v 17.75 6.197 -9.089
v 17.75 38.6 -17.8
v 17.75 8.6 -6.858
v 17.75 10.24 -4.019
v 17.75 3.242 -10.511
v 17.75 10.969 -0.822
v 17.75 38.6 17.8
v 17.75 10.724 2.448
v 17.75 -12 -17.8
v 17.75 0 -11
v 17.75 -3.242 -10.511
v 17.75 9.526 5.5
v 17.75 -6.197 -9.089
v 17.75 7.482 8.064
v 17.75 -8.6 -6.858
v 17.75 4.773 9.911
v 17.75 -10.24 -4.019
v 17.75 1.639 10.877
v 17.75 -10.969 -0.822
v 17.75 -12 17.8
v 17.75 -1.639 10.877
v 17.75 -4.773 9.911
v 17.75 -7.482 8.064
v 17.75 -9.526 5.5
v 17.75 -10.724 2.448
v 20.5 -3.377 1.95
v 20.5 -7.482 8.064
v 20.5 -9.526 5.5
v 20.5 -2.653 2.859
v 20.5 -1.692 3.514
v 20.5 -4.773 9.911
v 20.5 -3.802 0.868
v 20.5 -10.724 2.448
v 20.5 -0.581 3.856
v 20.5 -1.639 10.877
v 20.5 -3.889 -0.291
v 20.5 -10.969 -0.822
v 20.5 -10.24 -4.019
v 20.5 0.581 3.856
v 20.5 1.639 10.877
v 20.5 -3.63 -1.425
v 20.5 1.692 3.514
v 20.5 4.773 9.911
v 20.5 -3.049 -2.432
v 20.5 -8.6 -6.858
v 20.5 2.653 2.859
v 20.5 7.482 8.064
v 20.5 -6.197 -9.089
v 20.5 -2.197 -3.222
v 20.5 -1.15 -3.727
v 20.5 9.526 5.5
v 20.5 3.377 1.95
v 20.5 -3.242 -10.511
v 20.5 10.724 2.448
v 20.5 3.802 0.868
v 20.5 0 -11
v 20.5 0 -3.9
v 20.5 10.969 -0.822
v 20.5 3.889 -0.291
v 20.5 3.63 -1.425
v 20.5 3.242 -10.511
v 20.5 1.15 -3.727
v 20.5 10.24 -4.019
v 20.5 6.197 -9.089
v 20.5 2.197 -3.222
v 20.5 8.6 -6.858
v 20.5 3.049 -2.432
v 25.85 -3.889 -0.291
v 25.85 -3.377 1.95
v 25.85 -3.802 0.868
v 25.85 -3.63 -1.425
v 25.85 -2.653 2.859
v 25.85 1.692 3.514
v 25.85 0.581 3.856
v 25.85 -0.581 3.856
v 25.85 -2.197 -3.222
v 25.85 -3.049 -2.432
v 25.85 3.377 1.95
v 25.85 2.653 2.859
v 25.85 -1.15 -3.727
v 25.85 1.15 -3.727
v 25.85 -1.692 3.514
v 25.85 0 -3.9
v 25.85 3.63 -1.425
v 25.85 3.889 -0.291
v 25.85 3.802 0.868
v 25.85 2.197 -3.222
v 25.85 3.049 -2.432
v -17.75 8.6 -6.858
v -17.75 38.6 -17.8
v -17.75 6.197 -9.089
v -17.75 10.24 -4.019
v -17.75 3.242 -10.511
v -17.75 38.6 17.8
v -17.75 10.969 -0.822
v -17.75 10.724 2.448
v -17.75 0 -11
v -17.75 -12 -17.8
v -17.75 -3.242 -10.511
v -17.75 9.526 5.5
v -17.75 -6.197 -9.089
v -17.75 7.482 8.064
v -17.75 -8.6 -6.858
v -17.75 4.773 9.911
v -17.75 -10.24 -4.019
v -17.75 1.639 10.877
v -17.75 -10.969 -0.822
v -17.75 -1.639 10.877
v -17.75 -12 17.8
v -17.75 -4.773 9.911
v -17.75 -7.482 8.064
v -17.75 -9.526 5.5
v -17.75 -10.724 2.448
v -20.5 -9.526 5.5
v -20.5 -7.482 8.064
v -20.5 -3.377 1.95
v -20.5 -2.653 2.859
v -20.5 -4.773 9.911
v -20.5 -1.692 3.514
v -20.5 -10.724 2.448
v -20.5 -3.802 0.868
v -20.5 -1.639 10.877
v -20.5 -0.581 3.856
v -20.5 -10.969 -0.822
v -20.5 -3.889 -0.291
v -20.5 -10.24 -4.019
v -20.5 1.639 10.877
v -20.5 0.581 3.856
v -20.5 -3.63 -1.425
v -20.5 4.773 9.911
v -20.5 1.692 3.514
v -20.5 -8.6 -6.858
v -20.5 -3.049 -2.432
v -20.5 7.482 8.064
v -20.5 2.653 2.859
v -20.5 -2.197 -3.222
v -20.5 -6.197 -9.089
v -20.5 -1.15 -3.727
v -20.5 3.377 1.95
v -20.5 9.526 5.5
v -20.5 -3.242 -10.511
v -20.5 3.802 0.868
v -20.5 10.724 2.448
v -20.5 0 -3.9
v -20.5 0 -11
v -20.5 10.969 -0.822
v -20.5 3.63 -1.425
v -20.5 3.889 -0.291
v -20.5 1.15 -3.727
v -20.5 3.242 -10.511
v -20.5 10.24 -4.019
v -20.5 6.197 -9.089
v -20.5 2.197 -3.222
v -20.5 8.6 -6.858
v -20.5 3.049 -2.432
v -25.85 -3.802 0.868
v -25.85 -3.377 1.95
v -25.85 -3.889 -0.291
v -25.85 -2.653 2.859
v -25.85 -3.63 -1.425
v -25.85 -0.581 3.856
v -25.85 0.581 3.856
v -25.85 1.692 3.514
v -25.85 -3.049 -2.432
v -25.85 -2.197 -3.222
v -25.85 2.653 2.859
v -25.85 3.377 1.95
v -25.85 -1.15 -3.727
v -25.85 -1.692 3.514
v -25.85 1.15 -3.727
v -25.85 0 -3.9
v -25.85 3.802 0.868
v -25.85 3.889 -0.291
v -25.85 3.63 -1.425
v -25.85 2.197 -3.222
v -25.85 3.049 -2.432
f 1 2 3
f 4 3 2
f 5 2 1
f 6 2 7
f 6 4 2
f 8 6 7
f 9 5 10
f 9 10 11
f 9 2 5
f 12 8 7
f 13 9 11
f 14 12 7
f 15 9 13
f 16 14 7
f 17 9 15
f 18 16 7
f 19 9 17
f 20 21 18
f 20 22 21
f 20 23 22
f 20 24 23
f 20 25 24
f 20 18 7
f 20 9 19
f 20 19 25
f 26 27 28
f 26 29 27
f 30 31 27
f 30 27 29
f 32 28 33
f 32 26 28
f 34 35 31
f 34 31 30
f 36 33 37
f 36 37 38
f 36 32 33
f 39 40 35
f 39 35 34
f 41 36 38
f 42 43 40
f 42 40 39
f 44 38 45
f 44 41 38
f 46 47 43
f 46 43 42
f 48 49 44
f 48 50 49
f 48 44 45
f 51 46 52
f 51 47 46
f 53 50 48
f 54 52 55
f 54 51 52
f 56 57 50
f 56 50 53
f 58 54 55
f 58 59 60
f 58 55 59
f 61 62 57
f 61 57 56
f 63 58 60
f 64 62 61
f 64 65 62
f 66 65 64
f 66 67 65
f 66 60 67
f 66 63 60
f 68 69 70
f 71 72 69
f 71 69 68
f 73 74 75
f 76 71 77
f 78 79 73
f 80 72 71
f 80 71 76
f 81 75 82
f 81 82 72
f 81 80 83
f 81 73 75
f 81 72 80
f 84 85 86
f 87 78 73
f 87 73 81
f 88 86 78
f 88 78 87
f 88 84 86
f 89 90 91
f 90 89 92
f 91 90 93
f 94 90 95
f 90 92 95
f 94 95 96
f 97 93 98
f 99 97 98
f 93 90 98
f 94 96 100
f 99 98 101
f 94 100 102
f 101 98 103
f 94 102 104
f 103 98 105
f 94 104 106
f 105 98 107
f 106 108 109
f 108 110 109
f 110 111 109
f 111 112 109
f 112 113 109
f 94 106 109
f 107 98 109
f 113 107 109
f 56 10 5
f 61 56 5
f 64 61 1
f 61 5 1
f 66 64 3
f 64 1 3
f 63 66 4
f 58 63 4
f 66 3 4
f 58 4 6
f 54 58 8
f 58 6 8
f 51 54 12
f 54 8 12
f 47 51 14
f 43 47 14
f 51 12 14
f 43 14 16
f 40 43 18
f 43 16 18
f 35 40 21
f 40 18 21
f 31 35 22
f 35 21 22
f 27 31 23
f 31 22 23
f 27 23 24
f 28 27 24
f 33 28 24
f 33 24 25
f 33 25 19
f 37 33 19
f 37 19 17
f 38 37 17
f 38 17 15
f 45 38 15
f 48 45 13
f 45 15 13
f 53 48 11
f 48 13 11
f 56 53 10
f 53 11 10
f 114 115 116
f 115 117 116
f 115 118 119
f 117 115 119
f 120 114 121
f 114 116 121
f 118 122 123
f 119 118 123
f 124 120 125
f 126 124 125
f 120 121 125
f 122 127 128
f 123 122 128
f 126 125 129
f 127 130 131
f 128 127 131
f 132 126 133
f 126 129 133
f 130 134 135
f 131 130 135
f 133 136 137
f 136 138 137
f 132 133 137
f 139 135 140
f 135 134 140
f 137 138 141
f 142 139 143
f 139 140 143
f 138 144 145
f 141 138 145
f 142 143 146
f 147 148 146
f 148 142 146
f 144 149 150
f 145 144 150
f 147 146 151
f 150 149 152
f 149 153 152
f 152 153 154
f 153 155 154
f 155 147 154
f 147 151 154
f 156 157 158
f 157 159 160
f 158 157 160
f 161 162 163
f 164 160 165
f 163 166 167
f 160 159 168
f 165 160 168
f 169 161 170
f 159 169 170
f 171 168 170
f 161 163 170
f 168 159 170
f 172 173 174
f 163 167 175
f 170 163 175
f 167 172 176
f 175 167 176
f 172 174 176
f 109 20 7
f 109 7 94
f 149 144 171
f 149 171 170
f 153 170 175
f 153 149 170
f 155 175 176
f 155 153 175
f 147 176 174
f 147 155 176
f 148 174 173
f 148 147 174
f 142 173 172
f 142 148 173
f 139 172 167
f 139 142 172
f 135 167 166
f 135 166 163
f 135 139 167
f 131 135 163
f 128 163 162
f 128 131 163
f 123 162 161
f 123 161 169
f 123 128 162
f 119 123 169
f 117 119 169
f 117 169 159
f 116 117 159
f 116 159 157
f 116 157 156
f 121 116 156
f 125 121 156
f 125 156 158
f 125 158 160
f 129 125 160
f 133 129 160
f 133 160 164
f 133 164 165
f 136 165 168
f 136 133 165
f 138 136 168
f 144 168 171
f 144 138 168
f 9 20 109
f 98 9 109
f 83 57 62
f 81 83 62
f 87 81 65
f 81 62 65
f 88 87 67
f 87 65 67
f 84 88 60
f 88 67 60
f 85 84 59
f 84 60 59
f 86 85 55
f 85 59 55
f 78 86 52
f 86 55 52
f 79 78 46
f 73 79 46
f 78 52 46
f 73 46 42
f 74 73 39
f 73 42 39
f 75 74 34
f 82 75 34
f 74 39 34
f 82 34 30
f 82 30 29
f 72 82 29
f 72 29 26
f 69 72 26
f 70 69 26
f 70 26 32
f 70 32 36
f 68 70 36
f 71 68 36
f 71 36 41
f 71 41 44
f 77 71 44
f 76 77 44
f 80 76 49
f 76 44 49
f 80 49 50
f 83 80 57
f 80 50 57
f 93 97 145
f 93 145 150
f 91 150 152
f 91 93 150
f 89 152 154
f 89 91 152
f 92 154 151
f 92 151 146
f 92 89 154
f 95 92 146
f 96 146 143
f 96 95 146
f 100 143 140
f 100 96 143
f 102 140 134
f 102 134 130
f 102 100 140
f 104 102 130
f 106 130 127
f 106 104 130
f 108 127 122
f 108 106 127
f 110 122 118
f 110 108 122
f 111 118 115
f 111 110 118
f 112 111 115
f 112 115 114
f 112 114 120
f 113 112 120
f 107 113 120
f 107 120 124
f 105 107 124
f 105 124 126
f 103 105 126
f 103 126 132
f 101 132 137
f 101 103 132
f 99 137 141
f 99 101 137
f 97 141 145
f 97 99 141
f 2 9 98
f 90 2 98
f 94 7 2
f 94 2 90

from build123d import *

# Parameters (mm, degrees)
SKETCH2_W           = 35.5
SKETCH2_H           = 35.6
BOSS_EXTRUDE1_DEPTH = 50.6
SKETCH3_R           = 11
BOSS_EXTRUDE2_DEPTH = 2.75
SKETCH4_R           = 3.9
BOSS_EXTRUDE3_DEPTH = 5.35


with BuildPart() as part:
    # Sketch2 → Boss-Extrude1 (new body)
    with BuildSketch(Plane(origin=(0, -12, 0), x_dir=(-1, 0, 0), z_dir=(0, 1, 0))):
        Rectangle(SKETCH2_W, SKETCH2_H)
    extrude(amount=BOSS_EXTRUDE1_DEPTH)

    # Sketch3 → Boss-Extrude2 (add)
    with BuildSketch(Plane(origin=(17.75, 0, 0), x_dir=(0, 0, -1), z_dir=(1, 0, 0))):
        Circle(SKETCH3_R)
    boss_extrude2 = extrude(amount=BOSS_EXTRUDE2_DEPTH)

    # Sketch4 → Boss-Extrude3 (add)
    with BuildSketch(Plane(origin=(20.5, 0, 0), x_dir=(0, 0, -1), z_dir=(1, 0, 0))):
        Circle(SKETCH4_R)
    boss_extrude3 = extrude(amount=BOSS_EXTRUDE3_DEPTH)

    # Mirror1: Boss-Extrude2, Boss-Extrude3 across plane
    add(boss_extrude2.mirror(Plane(origin=(0, 0, 0), x_dir=(0, 0, 1), z_dir=(1, 0, 0))))
    add(boss_extrude3.mirror(Plane(origin=(0, 0, 0), x_dir=(0, 0, 1), z_dir=(1, 0, 0))))


solid = part.part
